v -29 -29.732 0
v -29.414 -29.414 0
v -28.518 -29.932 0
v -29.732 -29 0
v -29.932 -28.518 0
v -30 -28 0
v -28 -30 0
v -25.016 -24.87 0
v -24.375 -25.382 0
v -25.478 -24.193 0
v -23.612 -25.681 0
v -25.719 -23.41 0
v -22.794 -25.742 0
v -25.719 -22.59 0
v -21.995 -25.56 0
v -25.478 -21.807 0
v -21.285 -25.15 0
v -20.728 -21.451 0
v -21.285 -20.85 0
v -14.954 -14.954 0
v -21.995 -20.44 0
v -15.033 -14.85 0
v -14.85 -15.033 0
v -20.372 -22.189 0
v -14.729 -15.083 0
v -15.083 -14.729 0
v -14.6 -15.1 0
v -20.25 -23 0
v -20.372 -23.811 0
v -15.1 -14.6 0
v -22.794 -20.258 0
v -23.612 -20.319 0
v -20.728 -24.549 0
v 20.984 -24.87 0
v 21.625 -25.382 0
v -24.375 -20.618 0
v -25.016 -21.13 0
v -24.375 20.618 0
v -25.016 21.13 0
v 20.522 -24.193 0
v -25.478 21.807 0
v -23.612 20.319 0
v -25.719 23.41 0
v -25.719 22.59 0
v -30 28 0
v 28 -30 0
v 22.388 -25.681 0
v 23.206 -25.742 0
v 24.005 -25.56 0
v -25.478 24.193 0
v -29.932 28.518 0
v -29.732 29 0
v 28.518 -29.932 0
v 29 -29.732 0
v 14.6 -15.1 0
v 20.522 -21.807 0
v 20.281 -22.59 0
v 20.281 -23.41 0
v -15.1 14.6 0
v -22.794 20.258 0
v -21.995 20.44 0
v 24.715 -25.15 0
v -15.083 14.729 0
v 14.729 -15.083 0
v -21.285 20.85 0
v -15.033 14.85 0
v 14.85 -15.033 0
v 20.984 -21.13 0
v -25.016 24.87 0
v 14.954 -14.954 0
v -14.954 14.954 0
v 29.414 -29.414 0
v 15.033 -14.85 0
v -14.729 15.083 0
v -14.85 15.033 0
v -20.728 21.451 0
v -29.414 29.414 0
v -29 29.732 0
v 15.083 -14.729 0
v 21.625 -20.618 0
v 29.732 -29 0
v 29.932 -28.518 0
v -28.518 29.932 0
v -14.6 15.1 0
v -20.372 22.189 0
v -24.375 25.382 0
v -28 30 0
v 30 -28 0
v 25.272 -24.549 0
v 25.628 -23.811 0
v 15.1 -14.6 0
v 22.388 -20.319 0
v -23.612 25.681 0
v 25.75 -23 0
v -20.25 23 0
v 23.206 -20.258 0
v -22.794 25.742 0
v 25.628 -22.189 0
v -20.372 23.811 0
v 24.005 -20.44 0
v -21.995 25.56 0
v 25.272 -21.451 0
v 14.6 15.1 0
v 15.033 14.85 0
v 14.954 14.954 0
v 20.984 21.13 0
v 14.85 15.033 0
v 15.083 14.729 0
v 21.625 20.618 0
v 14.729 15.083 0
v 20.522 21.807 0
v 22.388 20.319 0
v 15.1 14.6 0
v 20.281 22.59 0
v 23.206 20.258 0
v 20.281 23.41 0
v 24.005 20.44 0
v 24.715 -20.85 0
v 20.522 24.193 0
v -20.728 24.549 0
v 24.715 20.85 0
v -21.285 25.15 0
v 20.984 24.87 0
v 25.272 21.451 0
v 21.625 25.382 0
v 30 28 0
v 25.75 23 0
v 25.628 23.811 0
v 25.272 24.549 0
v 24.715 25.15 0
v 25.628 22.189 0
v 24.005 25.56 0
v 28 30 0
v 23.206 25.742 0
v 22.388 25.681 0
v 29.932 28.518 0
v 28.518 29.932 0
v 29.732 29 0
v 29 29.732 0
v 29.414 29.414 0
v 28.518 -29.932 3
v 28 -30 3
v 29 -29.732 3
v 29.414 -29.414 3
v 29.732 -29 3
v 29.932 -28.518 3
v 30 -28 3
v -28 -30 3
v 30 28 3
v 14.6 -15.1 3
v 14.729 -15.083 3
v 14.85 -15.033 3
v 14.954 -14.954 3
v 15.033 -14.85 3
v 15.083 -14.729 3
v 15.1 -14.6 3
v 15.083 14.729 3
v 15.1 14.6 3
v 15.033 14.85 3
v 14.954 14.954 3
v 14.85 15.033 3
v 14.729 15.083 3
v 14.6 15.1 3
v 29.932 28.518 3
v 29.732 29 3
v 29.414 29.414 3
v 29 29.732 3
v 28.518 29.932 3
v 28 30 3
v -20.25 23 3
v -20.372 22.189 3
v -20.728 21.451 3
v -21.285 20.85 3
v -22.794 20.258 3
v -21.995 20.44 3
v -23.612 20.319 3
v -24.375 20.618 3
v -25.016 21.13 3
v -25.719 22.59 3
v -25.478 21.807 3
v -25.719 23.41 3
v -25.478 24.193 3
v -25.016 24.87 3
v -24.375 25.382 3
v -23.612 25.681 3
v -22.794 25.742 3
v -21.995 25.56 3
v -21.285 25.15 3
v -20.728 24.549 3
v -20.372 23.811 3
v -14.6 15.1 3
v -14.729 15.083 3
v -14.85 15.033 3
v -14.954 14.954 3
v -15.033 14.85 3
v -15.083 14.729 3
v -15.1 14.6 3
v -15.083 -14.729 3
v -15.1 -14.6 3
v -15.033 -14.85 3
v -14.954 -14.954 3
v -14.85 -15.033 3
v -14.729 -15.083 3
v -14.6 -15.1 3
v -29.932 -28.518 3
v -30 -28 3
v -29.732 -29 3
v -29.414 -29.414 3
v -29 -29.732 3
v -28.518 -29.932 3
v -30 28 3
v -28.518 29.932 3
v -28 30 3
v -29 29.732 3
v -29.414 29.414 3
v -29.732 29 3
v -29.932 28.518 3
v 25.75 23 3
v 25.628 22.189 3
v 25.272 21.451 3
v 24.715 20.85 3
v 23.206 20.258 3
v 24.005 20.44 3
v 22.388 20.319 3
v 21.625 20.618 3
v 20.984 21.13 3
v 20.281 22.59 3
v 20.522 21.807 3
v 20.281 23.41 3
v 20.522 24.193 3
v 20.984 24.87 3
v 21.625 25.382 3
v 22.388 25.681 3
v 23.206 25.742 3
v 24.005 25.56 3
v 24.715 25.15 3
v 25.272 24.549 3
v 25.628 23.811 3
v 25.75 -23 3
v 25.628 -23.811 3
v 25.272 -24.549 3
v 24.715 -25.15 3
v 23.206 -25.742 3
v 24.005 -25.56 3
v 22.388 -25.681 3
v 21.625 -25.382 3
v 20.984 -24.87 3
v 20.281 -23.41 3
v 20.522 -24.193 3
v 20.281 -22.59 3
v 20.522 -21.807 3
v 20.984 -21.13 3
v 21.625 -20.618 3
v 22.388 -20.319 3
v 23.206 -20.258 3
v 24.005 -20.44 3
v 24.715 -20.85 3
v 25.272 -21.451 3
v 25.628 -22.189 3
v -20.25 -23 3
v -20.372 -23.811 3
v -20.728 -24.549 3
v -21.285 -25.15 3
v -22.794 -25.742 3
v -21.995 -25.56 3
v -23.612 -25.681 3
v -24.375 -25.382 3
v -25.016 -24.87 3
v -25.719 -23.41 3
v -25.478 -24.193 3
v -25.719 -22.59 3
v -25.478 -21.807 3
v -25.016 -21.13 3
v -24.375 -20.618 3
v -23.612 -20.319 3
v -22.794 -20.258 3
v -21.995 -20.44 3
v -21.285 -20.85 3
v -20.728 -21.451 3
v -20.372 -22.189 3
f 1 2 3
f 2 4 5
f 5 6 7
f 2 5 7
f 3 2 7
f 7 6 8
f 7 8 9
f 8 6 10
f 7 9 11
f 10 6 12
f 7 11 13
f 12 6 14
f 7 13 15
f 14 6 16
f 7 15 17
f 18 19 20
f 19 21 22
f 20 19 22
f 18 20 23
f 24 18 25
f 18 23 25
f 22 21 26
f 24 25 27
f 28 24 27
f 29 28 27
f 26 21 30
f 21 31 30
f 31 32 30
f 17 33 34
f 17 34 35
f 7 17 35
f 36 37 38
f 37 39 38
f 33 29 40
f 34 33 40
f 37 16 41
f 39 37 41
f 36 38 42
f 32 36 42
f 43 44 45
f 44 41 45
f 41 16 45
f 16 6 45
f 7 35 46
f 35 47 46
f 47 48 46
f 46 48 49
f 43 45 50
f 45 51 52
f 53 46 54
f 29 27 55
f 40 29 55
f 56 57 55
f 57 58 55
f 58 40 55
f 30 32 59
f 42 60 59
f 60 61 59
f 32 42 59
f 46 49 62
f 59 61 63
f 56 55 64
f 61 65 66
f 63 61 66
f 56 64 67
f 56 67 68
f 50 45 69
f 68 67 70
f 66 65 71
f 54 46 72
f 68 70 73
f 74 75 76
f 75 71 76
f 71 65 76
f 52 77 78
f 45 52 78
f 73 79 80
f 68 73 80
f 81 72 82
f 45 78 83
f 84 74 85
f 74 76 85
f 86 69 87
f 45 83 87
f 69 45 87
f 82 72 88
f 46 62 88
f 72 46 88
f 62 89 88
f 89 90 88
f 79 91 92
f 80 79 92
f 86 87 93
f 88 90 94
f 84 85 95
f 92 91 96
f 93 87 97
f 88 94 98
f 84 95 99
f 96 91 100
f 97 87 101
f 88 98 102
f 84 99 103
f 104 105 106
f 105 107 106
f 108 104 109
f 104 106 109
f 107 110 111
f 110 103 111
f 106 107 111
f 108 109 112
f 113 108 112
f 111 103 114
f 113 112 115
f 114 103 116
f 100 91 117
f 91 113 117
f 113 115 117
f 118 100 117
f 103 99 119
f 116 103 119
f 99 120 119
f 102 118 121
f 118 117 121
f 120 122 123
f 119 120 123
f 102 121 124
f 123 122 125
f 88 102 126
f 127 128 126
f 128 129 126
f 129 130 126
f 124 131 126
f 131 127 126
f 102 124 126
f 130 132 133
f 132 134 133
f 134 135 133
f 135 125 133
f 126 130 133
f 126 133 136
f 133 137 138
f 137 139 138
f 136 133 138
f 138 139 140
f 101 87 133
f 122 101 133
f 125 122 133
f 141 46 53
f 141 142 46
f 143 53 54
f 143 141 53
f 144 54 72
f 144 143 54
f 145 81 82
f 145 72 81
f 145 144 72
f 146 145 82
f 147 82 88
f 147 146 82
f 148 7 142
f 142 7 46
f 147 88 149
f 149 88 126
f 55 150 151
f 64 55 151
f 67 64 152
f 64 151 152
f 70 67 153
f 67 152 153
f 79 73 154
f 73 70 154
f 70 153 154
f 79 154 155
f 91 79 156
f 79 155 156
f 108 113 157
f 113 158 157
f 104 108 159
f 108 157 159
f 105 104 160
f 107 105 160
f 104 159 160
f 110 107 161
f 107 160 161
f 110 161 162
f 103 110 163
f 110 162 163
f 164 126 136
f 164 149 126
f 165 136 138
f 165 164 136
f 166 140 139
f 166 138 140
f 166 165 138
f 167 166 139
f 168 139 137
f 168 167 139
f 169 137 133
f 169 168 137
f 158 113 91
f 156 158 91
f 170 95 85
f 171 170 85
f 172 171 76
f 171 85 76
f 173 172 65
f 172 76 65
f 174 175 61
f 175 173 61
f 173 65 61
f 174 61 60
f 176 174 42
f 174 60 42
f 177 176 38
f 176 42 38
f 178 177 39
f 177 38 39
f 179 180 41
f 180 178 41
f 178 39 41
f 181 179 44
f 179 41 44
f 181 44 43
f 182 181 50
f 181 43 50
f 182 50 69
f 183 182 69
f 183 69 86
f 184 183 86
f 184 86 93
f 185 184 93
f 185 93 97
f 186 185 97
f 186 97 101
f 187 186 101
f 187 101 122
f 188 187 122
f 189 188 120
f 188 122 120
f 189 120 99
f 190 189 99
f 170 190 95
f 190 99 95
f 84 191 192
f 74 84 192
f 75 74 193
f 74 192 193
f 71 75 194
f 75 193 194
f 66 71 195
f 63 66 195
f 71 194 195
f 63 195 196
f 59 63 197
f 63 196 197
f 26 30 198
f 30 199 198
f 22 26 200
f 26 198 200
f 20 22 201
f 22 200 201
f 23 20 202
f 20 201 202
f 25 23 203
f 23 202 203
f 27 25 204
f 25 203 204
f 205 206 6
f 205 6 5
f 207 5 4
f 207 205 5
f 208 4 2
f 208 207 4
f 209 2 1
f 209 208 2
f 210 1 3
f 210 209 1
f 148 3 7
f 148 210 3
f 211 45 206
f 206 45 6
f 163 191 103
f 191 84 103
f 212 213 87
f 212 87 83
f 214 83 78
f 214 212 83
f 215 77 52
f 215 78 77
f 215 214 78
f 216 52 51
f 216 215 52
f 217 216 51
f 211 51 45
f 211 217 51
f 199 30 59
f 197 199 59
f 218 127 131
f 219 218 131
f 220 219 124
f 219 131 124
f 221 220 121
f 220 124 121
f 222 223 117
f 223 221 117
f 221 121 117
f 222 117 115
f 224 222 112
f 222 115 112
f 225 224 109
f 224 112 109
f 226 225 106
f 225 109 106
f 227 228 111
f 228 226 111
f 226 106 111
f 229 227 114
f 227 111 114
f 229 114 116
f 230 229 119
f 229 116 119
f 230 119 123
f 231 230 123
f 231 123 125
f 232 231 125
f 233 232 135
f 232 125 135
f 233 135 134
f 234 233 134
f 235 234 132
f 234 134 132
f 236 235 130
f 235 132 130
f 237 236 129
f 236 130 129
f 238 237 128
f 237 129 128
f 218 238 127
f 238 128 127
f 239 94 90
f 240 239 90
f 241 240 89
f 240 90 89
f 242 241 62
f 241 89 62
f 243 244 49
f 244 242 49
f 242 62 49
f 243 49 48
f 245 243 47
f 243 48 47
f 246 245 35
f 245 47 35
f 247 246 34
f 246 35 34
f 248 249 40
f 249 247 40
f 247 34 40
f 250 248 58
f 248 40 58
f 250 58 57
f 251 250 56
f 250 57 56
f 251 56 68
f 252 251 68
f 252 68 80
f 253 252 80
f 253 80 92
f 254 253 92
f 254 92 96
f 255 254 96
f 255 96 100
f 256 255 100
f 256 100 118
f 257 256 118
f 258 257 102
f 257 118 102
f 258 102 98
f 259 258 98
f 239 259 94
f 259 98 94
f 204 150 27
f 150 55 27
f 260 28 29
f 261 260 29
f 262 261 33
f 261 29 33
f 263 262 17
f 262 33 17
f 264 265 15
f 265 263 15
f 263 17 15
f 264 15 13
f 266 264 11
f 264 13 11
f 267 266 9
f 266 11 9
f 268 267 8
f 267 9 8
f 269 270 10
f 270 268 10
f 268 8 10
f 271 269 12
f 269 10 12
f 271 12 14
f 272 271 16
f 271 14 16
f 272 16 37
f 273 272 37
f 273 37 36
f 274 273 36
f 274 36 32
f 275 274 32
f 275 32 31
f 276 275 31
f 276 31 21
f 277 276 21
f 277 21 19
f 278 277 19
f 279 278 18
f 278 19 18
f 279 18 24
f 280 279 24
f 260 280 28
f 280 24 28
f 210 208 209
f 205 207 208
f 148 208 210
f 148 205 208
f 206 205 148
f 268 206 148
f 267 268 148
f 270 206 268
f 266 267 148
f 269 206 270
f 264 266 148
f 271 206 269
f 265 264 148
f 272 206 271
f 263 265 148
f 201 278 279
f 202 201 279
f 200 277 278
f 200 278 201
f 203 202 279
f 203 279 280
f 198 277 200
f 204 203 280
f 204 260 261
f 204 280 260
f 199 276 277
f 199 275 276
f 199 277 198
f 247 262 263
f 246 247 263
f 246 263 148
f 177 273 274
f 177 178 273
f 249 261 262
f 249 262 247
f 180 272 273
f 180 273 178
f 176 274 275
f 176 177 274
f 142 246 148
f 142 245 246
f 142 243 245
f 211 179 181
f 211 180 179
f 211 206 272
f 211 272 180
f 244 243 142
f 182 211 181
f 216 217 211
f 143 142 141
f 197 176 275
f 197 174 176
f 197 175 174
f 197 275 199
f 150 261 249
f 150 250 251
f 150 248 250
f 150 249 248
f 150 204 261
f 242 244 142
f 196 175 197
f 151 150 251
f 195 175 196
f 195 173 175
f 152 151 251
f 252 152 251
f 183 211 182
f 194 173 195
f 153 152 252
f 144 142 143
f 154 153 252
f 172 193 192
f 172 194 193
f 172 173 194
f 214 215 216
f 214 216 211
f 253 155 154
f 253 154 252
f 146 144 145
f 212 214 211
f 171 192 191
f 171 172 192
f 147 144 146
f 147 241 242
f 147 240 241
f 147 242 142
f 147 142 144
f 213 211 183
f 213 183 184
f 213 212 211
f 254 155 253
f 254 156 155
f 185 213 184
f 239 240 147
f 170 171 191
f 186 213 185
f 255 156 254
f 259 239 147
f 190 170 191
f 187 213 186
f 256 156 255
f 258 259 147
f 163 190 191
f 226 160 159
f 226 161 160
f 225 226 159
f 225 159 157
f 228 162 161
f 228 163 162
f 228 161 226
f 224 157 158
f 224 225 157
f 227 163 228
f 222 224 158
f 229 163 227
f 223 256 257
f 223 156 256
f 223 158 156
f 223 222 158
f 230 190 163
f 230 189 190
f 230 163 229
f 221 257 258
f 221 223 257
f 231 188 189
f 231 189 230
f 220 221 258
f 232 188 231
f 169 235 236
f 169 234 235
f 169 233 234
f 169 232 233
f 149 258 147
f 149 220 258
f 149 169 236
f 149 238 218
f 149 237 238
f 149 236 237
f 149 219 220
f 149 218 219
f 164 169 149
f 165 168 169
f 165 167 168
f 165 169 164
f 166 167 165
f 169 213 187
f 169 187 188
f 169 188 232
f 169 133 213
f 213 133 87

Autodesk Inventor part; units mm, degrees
ref_plane "YZ Plane" through (0, 0, 0) normal (1, 0, 0) x (0, 1, 0)
ref_plane "XZ Plane" through (0, 0, 0) normal (0, 1, 0) x (-1, 0, 0)
ref_plane "XY Plane" through (0, 0, 0) normal (0, 0, 1) x (1, 0, 0)
sketch "Sketch1" plane through (0, 0, 0) normal (0, 0, 1) x (1, 0, 0)
  line L0 (-30, -30) -> (30, -30)
  line L1 (30, -30) -> (30, 30)
  line L2 (30, 30) -> (-30, 30)
  line L3 (-30, 30) -> (-30, -30)
  line L4 (-30, -30) -> (30, 30) construction
  line L5 (30, -30) -> (-30, 30) construction
  line L6 (15.1, -15.1) -> (-15.1, -15.1)
  line L7 (-15.1, -15.1) -> (-15.1, 15.1)
  line L8 (-15.1, 15.1) -> (15.1, 15.1)
  line L9 (15.1, 15.1) -> (15.1, -15.1)
  line L10 (15.1, -15.1) -> (-15.1, 15.1) construction
  line L11 (-15.1, -15.1) -> (15.1, 15.1) construction
  circle A0 centre (-23, -23) radius 2.75
  circle A1 centre (23, -23) radius 2.75
  circle A2 centre (23, 23) radius 2.75
  circle A3 centre (-23, 23) radius 2.75
  line L12 (25.75, 25.75) -> (-25.75, 25.75) construction
  line L13 (-25.75, 25.75) -> (-25.75, -25.75) construction
  line L14 (-25.75, -25.75) -> (25.75, -25.75) construction
  line L15 (25.75, -25.75) -> (25.75, 25.75) construction
  line L16 (25.75, 25.75) -> (-25.75, -25.75) construction
  line L17 (-25.75, 25.75) -> (25.75, -25.75) construction
  line L18 (23, 23) -> (-23, 23) construction
  line L19 (-23, 23) -> (-23, -23) construction
  line L20 (-23, -23) -> (23, -23) construction
  line L21 (23, -23) -> (23, 23) construction
  line L22 (23, 23) -> (-23, -23) construction
  line L23 (-23, 23) -> (23, -23) construction
  point P0 (0, 0)
  dimension "d172" = 30.2
  dimension "d190" = 5.5
  dimension "d191" = 46
  dimension "d192" = 60
extrude "Plate5" add sketch "Sketch1" along normal blind 3
fillet "Corner Round1" radius 2 4 edges at (30, 30, 1.5) (-30, 30, 1.5) (-30, -30, 1.5) (30, -30, 1.5)
fillet "Corner Round2" radius 0.5 4 edges at (-15.1, 15.1, 1.5) (-15.1, -15.1, 1.5) (15.1, -15.1, 1.5) (15.1, 15.1, 1.5)
properties part number "PRS 1425 DrSysB Way FLANGE_1200" material "Stainless Steel"
